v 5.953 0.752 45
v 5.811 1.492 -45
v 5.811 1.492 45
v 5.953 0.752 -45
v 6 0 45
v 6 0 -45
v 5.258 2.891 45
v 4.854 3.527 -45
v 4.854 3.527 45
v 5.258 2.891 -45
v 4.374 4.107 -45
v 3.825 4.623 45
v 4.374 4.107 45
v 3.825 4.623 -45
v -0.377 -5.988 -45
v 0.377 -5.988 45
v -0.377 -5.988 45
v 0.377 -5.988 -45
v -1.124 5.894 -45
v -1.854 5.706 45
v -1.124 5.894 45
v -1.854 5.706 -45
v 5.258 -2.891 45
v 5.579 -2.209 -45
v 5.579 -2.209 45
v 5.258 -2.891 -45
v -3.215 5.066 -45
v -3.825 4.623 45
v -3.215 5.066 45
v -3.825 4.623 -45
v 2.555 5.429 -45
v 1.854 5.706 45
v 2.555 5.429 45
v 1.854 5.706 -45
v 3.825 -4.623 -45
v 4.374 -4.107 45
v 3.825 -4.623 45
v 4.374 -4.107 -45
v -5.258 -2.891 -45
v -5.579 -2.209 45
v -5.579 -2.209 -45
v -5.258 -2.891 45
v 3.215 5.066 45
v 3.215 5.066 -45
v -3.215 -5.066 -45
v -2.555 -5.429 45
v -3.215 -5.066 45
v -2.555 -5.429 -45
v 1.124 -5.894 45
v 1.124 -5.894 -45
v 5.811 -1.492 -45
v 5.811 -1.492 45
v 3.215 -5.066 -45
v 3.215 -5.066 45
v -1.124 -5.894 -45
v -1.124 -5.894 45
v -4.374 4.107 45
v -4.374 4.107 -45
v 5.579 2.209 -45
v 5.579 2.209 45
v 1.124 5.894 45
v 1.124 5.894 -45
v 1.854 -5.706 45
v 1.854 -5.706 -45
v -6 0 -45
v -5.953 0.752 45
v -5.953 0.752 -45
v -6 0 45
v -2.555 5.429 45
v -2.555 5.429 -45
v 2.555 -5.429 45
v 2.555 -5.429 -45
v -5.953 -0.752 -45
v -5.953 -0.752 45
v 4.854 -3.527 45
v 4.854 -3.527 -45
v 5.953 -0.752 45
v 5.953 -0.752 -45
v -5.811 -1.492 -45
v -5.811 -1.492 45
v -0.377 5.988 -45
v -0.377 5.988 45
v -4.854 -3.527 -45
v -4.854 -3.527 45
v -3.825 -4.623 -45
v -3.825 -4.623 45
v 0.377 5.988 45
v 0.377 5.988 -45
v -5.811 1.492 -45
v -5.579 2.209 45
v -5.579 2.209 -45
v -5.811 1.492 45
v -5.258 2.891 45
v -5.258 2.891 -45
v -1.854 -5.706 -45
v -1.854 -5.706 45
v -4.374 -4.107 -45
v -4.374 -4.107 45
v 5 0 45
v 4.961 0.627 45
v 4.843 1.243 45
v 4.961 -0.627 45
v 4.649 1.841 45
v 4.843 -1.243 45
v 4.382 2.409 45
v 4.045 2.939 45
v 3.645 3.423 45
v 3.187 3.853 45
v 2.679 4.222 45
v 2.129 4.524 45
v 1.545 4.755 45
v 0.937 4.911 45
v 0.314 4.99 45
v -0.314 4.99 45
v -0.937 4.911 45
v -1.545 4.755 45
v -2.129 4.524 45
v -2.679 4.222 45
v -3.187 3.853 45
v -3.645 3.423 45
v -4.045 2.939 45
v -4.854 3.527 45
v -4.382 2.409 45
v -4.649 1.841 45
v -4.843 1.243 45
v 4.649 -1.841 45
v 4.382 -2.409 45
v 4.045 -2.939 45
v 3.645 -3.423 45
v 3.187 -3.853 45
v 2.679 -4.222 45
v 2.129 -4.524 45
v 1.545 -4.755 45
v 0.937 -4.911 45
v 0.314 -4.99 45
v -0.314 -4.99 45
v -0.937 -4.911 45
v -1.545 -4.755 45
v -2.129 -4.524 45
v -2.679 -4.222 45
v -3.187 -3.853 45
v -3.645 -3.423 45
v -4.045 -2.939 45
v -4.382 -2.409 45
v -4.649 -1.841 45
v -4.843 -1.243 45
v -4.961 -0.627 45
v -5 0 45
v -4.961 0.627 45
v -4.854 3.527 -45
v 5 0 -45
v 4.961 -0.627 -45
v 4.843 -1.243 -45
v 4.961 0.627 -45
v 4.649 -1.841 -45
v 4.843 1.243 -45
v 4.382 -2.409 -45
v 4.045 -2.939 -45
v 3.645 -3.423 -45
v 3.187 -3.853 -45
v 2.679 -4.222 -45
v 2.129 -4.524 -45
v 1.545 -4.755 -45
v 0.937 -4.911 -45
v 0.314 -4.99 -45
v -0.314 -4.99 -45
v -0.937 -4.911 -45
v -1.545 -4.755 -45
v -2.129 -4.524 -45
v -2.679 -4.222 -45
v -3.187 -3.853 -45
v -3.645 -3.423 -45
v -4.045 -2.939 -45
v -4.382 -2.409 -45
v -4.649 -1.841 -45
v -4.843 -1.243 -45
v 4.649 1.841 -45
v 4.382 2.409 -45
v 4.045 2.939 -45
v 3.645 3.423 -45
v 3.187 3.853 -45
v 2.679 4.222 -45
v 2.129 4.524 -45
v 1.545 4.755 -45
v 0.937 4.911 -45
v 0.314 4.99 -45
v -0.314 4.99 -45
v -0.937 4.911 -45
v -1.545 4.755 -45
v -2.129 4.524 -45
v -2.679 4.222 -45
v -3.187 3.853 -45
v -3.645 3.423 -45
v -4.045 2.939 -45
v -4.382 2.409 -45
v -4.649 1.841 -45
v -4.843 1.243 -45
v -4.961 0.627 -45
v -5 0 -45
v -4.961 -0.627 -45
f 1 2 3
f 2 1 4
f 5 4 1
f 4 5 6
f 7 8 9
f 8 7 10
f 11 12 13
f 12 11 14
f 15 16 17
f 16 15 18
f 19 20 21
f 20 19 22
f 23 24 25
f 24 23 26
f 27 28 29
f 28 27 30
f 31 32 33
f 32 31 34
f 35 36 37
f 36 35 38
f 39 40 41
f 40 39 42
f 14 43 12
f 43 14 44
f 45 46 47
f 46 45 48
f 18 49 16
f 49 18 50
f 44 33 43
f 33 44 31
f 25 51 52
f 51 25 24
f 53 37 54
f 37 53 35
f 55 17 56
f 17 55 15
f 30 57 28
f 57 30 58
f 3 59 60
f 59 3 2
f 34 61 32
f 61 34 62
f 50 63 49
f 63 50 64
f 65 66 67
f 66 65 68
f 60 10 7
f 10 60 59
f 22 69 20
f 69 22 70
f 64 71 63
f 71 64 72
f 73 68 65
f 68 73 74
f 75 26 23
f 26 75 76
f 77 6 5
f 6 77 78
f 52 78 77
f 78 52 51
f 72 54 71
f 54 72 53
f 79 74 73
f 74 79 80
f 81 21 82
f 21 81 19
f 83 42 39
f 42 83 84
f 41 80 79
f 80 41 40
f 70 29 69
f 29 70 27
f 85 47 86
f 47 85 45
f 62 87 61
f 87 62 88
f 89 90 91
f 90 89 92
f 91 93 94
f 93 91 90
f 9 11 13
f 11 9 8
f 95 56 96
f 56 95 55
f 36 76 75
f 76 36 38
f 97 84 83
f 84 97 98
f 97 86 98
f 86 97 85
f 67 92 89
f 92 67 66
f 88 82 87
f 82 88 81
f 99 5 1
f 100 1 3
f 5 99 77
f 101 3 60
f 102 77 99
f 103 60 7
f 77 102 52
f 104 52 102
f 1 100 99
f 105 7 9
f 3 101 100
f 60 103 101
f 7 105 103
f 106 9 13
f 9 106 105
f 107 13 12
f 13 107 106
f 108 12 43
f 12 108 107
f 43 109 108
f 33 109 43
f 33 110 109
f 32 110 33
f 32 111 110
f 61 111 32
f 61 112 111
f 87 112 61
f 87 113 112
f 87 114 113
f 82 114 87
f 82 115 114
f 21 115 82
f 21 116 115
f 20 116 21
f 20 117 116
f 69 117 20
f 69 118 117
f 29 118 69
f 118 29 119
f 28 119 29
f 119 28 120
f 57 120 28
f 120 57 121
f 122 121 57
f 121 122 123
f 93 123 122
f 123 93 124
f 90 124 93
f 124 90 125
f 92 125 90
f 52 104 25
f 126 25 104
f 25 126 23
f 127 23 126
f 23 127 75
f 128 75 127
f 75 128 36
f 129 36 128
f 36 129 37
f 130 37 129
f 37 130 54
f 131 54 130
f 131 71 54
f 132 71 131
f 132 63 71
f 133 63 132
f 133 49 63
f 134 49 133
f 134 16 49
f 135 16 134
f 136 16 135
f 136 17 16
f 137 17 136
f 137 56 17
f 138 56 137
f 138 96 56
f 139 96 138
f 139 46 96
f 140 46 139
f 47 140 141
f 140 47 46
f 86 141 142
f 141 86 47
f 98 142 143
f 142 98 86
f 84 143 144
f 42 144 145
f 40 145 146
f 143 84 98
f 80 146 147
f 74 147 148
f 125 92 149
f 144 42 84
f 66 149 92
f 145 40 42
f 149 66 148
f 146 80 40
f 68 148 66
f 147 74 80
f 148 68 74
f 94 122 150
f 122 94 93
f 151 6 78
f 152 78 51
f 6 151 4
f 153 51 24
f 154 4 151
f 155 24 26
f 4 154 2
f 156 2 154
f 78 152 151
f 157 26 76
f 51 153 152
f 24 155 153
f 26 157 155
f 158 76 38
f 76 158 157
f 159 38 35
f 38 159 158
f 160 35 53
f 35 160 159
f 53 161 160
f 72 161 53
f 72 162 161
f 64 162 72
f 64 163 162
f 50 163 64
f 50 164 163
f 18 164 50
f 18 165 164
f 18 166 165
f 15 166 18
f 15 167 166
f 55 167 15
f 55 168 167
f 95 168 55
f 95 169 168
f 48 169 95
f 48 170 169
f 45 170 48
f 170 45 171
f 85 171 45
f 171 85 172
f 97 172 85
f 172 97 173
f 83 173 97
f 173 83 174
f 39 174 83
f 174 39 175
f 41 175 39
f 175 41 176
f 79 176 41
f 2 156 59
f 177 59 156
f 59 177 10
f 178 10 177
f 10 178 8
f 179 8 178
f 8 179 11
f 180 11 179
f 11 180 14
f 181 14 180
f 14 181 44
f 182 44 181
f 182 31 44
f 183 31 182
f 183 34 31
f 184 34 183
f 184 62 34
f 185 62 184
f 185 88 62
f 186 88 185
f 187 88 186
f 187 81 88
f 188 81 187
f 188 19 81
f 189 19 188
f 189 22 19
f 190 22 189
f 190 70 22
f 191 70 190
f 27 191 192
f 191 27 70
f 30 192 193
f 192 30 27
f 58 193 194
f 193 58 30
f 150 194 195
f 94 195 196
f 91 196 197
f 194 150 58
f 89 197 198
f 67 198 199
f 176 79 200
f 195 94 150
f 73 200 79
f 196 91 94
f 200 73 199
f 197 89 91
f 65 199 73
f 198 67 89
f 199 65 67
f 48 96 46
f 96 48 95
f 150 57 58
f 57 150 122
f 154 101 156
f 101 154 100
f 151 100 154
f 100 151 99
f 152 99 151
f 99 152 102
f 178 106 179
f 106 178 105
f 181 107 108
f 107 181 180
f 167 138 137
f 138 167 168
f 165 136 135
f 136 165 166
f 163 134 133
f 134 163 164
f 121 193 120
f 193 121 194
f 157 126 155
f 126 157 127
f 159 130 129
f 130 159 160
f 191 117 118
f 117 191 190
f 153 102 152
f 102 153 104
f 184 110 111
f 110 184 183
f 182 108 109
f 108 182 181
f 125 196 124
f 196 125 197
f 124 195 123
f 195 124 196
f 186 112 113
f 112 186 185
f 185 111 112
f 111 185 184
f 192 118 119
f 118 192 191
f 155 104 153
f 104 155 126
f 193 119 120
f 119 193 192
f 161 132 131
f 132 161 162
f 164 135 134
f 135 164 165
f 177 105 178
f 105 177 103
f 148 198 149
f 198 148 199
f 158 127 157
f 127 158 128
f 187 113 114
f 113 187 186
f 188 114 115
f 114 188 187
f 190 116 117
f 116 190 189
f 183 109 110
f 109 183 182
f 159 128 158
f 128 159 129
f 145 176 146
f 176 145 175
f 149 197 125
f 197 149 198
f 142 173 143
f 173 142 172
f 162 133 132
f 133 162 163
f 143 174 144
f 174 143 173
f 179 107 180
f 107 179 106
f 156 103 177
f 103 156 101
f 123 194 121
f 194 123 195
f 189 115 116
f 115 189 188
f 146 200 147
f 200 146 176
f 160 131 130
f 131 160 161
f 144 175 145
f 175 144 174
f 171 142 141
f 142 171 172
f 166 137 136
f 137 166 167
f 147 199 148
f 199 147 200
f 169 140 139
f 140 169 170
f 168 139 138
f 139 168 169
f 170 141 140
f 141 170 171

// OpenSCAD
$fn = 50;


difference() {
	union() {
		translate(v = [0, 0, -45.0000000000]) {
			cylinder(h = 90, r = 6.0000000000);
		}
	}
	union() {
		translate(v = [0, 0, -100.0000000000]) {
			cylinder(h = 200, r = 5.0000000000);
		}
	}
}
